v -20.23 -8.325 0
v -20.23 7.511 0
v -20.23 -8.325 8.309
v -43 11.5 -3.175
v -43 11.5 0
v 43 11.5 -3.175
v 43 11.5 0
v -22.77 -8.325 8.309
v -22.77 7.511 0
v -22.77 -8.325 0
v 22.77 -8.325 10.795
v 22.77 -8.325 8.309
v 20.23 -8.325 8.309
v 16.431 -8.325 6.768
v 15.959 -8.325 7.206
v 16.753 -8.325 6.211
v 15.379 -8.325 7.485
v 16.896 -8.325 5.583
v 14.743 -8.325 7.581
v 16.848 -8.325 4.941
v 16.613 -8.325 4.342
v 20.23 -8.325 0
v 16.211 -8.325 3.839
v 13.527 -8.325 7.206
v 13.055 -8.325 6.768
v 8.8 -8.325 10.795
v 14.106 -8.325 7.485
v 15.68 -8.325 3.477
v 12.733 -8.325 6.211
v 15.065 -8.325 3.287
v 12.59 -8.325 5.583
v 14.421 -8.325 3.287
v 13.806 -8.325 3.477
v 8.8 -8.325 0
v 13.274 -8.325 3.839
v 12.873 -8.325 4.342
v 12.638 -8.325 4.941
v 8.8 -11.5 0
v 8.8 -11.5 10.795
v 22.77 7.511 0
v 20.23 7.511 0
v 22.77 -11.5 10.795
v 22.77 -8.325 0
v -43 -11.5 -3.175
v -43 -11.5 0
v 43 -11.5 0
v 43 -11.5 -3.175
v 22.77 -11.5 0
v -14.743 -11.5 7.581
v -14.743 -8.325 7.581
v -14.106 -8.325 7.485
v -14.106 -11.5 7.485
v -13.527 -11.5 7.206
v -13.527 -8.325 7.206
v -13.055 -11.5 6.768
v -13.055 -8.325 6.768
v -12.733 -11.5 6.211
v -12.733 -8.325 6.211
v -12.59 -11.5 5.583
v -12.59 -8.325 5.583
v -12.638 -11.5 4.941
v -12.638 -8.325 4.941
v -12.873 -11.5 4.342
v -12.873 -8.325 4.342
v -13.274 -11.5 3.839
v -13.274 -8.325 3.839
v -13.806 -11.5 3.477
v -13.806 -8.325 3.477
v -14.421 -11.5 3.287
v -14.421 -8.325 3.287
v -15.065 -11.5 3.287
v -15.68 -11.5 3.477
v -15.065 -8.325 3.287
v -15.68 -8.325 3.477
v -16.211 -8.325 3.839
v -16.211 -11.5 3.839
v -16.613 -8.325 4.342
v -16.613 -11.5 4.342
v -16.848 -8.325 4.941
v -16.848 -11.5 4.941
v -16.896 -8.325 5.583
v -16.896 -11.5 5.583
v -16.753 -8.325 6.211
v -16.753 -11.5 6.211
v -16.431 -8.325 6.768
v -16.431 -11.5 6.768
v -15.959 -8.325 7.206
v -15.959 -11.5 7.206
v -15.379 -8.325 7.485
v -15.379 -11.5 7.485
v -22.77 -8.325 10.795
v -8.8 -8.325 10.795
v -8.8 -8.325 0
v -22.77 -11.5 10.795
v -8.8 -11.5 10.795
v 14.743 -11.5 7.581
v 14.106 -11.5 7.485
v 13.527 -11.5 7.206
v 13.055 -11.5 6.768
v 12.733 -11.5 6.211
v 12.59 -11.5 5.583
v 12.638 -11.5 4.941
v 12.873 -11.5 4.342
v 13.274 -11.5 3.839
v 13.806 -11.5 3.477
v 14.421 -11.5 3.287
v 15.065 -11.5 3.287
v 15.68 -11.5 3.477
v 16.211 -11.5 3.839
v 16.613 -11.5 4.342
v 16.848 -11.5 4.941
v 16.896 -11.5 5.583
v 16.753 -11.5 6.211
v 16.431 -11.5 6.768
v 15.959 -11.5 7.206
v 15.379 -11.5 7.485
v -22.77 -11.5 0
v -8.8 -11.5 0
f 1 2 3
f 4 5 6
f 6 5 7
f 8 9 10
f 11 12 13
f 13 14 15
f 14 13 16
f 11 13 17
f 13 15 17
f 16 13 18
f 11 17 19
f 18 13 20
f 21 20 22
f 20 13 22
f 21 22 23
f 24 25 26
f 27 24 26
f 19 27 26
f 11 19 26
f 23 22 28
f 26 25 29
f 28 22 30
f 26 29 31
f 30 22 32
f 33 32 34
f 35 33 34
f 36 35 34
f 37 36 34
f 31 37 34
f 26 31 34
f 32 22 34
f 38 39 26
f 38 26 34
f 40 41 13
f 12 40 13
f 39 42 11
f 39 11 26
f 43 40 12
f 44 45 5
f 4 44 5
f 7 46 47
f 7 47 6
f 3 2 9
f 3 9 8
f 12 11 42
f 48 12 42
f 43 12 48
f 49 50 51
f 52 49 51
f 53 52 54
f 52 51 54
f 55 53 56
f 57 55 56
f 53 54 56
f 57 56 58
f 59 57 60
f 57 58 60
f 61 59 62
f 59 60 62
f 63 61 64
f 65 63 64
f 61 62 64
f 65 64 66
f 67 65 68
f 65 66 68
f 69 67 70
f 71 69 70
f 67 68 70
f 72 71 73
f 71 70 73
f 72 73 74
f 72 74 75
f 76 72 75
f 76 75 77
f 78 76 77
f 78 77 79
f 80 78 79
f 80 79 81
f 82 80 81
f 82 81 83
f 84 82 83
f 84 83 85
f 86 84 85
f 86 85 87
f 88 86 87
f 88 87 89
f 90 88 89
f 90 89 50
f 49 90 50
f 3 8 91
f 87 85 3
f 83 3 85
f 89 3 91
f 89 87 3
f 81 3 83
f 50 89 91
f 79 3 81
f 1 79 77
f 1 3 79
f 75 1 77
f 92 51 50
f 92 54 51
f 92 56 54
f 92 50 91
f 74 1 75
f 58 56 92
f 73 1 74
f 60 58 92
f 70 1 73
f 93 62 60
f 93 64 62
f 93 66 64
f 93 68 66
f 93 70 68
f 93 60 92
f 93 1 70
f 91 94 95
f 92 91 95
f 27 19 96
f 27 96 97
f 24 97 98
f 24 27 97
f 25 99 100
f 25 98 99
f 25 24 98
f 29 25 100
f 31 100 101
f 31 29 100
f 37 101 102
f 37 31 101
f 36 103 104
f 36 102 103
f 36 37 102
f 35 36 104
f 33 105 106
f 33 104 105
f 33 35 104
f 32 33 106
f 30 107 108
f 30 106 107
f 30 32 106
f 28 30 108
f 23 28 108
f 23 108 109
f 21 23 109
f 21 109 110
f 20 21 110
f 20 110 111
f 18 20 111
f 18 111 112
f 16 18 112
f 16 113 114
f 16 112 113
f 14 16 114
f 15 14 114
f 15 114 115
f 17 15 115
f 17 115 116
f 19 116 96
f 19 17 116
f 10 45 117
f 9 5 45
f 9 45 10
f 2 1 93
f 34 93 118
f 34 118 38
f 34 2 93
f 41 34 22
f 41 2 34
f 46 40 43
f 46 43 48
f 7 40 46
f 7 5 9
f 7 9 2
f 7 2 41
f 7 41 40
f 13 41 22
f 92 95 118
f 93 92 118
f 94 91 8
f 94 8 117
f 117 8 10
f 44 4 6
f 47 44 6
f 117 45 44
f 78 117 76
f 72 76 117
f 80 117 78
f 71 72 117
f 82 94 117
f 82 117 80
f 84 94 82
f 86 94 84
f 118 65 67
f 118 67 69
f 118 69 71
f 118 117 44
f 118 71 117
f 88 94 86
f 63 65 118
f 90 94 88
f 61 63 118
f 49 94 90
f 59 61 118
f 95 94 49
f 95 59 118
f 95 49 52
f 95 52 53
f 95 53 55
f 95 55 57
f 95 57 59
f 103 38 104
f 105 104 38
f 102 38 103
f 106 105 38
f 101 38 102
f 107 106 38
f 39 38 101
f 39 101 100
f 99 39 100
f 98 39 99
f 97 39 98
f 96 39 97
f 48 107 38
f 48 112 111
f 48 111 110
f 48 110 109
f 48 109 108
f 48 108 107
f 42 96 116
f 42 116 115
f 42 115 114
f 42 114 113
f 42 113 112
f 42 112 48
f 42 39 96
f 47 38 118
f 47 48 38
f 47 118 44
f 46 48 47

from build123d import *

# Parameters (mm, degrees)
SKETCH1_W           = 86
SKETCH1_H           = 23
BOSS_EXTRUDE1_DEPTH = 3.175
BOSS_EXTRUDE2_DEPTH = 3.175
RIB4_REACH          = 68.401
SKETCH11_WALL_W     = 152.68434621
SKETCH11_WALL_H     = 2.54
SKETCH17_W          = 11.43
SKETCH17_H          = 10.795
CUT_EXTRUDE1_DEPTH  = 127
SKETCH18_R          = 2.159
CUT_EXTRUDE2_DEPTH  = 127


with BuildPart() as part:
    # Sketch1 → Boss-Extrude1 (new body)
    with BuildSketch(Plane.XY):
        Rectangle(SKETCH1_W, SKETCH1_H)
    extrude(amount=-BOSS_EXTRUDE1_DEPTH)

    # Sketch3 → Boss-Extrude2 (add)
    with BuildSketch(Plane(origin=(0, -11.5, 0), x_dir=(-1, 0, 0), z_dir=(0, -1, 0))):
        Polygon((34.200000011, 0), (34.200000011, -10.795), (8.80000001, -10.795), (8.800000011, 0), align=None)
        Polygon((-34.200000011, 0), (-34.200000011, -10.795), (-8.80000001, -10.795), (-8.800000011, 0), align=None)
    extrude(amount=-BOSS_EXTRUDE2_DEPTH)

    # Sketch11 wall → Rib4 (add, up to next)
    with BuildSketch(Plane(origin=(-21.500000011, -0.407189587, 4.154640606), x_dir=(-5.6e-11, -0.885499596527, 0.46464014522), z_dir=(0, 0.46464014522, 0.885499596527)), mode=Mode.PRIVATE) as rib4_sk1:
        Rectangle(SKETCH11_WALL_W, SKETCH11_WALL_H)
    rib4_tool1 = extrude(rib4_sk1.sketch, amount=-RIB4_REACH, mode=Mode.PRIVATE) - part.part
    rib4 = rib4_tool1.solids().sort_by_distance((-21.500000011, -0.407189587, 4.154640606))[0]
    add(rib4)

    # Mirror1: Rib4 across plane
    add(rib4.mirror(Plane(origin=(0, 0, 0), x_dir=(0, 0, 1), z_dir=(1, 0, 0))))

    # Sketch17 → Cut-Extrude1 (cut)
    with BuildSketch(Plane(origin=(0, 11.5, 0), x_dir=(1, 0, 0), z_dir=(0, 1, 0))):
        with Locations((-28.485000011, -5.3975)):
            Rectangle(SKETCH17_W, SKETCH17_H)
    cut_extrude1 = extrude(amount=-CUT_EXTRUDE1_DEPTH, mode=Mode.SUBTRACT)

    # Mirror2: Cut-Extrude1 across plane
    add(cut_extrude1.mirror(Plane(origin=(0, 0, 0), x_dir=(0, 0, 1), z_dir=(1, 0, 0))), mode=Mode.SUBTRACT)

    # Sketch18 → Cut-Extrude2 (cut)
    with BuildSketch(Plane(origin=(0, 11.5, 0), x_dir=(1, 0, 0), z_dir=(0, 1, 0))):
        with Locations(Location((-14.74281704, -5.421760778, 0), (0, 0, 270))):
            Circle(SKETCH18_R)
    cut_extrude2 = extrude(amount=-CUT_EXTRUDE2_DEPTH, mode=Mode.SUBTRACT)

    # Mirror3: Cut-Extrude2 across plane
    add(cut_extrude2.mirror(Plane(origin=(0, 0, 0), x_dir=(0, 0, 1), z_dir=(1, 0, 0))), mode=Mode.SUBTRACT)


solid = part.part
